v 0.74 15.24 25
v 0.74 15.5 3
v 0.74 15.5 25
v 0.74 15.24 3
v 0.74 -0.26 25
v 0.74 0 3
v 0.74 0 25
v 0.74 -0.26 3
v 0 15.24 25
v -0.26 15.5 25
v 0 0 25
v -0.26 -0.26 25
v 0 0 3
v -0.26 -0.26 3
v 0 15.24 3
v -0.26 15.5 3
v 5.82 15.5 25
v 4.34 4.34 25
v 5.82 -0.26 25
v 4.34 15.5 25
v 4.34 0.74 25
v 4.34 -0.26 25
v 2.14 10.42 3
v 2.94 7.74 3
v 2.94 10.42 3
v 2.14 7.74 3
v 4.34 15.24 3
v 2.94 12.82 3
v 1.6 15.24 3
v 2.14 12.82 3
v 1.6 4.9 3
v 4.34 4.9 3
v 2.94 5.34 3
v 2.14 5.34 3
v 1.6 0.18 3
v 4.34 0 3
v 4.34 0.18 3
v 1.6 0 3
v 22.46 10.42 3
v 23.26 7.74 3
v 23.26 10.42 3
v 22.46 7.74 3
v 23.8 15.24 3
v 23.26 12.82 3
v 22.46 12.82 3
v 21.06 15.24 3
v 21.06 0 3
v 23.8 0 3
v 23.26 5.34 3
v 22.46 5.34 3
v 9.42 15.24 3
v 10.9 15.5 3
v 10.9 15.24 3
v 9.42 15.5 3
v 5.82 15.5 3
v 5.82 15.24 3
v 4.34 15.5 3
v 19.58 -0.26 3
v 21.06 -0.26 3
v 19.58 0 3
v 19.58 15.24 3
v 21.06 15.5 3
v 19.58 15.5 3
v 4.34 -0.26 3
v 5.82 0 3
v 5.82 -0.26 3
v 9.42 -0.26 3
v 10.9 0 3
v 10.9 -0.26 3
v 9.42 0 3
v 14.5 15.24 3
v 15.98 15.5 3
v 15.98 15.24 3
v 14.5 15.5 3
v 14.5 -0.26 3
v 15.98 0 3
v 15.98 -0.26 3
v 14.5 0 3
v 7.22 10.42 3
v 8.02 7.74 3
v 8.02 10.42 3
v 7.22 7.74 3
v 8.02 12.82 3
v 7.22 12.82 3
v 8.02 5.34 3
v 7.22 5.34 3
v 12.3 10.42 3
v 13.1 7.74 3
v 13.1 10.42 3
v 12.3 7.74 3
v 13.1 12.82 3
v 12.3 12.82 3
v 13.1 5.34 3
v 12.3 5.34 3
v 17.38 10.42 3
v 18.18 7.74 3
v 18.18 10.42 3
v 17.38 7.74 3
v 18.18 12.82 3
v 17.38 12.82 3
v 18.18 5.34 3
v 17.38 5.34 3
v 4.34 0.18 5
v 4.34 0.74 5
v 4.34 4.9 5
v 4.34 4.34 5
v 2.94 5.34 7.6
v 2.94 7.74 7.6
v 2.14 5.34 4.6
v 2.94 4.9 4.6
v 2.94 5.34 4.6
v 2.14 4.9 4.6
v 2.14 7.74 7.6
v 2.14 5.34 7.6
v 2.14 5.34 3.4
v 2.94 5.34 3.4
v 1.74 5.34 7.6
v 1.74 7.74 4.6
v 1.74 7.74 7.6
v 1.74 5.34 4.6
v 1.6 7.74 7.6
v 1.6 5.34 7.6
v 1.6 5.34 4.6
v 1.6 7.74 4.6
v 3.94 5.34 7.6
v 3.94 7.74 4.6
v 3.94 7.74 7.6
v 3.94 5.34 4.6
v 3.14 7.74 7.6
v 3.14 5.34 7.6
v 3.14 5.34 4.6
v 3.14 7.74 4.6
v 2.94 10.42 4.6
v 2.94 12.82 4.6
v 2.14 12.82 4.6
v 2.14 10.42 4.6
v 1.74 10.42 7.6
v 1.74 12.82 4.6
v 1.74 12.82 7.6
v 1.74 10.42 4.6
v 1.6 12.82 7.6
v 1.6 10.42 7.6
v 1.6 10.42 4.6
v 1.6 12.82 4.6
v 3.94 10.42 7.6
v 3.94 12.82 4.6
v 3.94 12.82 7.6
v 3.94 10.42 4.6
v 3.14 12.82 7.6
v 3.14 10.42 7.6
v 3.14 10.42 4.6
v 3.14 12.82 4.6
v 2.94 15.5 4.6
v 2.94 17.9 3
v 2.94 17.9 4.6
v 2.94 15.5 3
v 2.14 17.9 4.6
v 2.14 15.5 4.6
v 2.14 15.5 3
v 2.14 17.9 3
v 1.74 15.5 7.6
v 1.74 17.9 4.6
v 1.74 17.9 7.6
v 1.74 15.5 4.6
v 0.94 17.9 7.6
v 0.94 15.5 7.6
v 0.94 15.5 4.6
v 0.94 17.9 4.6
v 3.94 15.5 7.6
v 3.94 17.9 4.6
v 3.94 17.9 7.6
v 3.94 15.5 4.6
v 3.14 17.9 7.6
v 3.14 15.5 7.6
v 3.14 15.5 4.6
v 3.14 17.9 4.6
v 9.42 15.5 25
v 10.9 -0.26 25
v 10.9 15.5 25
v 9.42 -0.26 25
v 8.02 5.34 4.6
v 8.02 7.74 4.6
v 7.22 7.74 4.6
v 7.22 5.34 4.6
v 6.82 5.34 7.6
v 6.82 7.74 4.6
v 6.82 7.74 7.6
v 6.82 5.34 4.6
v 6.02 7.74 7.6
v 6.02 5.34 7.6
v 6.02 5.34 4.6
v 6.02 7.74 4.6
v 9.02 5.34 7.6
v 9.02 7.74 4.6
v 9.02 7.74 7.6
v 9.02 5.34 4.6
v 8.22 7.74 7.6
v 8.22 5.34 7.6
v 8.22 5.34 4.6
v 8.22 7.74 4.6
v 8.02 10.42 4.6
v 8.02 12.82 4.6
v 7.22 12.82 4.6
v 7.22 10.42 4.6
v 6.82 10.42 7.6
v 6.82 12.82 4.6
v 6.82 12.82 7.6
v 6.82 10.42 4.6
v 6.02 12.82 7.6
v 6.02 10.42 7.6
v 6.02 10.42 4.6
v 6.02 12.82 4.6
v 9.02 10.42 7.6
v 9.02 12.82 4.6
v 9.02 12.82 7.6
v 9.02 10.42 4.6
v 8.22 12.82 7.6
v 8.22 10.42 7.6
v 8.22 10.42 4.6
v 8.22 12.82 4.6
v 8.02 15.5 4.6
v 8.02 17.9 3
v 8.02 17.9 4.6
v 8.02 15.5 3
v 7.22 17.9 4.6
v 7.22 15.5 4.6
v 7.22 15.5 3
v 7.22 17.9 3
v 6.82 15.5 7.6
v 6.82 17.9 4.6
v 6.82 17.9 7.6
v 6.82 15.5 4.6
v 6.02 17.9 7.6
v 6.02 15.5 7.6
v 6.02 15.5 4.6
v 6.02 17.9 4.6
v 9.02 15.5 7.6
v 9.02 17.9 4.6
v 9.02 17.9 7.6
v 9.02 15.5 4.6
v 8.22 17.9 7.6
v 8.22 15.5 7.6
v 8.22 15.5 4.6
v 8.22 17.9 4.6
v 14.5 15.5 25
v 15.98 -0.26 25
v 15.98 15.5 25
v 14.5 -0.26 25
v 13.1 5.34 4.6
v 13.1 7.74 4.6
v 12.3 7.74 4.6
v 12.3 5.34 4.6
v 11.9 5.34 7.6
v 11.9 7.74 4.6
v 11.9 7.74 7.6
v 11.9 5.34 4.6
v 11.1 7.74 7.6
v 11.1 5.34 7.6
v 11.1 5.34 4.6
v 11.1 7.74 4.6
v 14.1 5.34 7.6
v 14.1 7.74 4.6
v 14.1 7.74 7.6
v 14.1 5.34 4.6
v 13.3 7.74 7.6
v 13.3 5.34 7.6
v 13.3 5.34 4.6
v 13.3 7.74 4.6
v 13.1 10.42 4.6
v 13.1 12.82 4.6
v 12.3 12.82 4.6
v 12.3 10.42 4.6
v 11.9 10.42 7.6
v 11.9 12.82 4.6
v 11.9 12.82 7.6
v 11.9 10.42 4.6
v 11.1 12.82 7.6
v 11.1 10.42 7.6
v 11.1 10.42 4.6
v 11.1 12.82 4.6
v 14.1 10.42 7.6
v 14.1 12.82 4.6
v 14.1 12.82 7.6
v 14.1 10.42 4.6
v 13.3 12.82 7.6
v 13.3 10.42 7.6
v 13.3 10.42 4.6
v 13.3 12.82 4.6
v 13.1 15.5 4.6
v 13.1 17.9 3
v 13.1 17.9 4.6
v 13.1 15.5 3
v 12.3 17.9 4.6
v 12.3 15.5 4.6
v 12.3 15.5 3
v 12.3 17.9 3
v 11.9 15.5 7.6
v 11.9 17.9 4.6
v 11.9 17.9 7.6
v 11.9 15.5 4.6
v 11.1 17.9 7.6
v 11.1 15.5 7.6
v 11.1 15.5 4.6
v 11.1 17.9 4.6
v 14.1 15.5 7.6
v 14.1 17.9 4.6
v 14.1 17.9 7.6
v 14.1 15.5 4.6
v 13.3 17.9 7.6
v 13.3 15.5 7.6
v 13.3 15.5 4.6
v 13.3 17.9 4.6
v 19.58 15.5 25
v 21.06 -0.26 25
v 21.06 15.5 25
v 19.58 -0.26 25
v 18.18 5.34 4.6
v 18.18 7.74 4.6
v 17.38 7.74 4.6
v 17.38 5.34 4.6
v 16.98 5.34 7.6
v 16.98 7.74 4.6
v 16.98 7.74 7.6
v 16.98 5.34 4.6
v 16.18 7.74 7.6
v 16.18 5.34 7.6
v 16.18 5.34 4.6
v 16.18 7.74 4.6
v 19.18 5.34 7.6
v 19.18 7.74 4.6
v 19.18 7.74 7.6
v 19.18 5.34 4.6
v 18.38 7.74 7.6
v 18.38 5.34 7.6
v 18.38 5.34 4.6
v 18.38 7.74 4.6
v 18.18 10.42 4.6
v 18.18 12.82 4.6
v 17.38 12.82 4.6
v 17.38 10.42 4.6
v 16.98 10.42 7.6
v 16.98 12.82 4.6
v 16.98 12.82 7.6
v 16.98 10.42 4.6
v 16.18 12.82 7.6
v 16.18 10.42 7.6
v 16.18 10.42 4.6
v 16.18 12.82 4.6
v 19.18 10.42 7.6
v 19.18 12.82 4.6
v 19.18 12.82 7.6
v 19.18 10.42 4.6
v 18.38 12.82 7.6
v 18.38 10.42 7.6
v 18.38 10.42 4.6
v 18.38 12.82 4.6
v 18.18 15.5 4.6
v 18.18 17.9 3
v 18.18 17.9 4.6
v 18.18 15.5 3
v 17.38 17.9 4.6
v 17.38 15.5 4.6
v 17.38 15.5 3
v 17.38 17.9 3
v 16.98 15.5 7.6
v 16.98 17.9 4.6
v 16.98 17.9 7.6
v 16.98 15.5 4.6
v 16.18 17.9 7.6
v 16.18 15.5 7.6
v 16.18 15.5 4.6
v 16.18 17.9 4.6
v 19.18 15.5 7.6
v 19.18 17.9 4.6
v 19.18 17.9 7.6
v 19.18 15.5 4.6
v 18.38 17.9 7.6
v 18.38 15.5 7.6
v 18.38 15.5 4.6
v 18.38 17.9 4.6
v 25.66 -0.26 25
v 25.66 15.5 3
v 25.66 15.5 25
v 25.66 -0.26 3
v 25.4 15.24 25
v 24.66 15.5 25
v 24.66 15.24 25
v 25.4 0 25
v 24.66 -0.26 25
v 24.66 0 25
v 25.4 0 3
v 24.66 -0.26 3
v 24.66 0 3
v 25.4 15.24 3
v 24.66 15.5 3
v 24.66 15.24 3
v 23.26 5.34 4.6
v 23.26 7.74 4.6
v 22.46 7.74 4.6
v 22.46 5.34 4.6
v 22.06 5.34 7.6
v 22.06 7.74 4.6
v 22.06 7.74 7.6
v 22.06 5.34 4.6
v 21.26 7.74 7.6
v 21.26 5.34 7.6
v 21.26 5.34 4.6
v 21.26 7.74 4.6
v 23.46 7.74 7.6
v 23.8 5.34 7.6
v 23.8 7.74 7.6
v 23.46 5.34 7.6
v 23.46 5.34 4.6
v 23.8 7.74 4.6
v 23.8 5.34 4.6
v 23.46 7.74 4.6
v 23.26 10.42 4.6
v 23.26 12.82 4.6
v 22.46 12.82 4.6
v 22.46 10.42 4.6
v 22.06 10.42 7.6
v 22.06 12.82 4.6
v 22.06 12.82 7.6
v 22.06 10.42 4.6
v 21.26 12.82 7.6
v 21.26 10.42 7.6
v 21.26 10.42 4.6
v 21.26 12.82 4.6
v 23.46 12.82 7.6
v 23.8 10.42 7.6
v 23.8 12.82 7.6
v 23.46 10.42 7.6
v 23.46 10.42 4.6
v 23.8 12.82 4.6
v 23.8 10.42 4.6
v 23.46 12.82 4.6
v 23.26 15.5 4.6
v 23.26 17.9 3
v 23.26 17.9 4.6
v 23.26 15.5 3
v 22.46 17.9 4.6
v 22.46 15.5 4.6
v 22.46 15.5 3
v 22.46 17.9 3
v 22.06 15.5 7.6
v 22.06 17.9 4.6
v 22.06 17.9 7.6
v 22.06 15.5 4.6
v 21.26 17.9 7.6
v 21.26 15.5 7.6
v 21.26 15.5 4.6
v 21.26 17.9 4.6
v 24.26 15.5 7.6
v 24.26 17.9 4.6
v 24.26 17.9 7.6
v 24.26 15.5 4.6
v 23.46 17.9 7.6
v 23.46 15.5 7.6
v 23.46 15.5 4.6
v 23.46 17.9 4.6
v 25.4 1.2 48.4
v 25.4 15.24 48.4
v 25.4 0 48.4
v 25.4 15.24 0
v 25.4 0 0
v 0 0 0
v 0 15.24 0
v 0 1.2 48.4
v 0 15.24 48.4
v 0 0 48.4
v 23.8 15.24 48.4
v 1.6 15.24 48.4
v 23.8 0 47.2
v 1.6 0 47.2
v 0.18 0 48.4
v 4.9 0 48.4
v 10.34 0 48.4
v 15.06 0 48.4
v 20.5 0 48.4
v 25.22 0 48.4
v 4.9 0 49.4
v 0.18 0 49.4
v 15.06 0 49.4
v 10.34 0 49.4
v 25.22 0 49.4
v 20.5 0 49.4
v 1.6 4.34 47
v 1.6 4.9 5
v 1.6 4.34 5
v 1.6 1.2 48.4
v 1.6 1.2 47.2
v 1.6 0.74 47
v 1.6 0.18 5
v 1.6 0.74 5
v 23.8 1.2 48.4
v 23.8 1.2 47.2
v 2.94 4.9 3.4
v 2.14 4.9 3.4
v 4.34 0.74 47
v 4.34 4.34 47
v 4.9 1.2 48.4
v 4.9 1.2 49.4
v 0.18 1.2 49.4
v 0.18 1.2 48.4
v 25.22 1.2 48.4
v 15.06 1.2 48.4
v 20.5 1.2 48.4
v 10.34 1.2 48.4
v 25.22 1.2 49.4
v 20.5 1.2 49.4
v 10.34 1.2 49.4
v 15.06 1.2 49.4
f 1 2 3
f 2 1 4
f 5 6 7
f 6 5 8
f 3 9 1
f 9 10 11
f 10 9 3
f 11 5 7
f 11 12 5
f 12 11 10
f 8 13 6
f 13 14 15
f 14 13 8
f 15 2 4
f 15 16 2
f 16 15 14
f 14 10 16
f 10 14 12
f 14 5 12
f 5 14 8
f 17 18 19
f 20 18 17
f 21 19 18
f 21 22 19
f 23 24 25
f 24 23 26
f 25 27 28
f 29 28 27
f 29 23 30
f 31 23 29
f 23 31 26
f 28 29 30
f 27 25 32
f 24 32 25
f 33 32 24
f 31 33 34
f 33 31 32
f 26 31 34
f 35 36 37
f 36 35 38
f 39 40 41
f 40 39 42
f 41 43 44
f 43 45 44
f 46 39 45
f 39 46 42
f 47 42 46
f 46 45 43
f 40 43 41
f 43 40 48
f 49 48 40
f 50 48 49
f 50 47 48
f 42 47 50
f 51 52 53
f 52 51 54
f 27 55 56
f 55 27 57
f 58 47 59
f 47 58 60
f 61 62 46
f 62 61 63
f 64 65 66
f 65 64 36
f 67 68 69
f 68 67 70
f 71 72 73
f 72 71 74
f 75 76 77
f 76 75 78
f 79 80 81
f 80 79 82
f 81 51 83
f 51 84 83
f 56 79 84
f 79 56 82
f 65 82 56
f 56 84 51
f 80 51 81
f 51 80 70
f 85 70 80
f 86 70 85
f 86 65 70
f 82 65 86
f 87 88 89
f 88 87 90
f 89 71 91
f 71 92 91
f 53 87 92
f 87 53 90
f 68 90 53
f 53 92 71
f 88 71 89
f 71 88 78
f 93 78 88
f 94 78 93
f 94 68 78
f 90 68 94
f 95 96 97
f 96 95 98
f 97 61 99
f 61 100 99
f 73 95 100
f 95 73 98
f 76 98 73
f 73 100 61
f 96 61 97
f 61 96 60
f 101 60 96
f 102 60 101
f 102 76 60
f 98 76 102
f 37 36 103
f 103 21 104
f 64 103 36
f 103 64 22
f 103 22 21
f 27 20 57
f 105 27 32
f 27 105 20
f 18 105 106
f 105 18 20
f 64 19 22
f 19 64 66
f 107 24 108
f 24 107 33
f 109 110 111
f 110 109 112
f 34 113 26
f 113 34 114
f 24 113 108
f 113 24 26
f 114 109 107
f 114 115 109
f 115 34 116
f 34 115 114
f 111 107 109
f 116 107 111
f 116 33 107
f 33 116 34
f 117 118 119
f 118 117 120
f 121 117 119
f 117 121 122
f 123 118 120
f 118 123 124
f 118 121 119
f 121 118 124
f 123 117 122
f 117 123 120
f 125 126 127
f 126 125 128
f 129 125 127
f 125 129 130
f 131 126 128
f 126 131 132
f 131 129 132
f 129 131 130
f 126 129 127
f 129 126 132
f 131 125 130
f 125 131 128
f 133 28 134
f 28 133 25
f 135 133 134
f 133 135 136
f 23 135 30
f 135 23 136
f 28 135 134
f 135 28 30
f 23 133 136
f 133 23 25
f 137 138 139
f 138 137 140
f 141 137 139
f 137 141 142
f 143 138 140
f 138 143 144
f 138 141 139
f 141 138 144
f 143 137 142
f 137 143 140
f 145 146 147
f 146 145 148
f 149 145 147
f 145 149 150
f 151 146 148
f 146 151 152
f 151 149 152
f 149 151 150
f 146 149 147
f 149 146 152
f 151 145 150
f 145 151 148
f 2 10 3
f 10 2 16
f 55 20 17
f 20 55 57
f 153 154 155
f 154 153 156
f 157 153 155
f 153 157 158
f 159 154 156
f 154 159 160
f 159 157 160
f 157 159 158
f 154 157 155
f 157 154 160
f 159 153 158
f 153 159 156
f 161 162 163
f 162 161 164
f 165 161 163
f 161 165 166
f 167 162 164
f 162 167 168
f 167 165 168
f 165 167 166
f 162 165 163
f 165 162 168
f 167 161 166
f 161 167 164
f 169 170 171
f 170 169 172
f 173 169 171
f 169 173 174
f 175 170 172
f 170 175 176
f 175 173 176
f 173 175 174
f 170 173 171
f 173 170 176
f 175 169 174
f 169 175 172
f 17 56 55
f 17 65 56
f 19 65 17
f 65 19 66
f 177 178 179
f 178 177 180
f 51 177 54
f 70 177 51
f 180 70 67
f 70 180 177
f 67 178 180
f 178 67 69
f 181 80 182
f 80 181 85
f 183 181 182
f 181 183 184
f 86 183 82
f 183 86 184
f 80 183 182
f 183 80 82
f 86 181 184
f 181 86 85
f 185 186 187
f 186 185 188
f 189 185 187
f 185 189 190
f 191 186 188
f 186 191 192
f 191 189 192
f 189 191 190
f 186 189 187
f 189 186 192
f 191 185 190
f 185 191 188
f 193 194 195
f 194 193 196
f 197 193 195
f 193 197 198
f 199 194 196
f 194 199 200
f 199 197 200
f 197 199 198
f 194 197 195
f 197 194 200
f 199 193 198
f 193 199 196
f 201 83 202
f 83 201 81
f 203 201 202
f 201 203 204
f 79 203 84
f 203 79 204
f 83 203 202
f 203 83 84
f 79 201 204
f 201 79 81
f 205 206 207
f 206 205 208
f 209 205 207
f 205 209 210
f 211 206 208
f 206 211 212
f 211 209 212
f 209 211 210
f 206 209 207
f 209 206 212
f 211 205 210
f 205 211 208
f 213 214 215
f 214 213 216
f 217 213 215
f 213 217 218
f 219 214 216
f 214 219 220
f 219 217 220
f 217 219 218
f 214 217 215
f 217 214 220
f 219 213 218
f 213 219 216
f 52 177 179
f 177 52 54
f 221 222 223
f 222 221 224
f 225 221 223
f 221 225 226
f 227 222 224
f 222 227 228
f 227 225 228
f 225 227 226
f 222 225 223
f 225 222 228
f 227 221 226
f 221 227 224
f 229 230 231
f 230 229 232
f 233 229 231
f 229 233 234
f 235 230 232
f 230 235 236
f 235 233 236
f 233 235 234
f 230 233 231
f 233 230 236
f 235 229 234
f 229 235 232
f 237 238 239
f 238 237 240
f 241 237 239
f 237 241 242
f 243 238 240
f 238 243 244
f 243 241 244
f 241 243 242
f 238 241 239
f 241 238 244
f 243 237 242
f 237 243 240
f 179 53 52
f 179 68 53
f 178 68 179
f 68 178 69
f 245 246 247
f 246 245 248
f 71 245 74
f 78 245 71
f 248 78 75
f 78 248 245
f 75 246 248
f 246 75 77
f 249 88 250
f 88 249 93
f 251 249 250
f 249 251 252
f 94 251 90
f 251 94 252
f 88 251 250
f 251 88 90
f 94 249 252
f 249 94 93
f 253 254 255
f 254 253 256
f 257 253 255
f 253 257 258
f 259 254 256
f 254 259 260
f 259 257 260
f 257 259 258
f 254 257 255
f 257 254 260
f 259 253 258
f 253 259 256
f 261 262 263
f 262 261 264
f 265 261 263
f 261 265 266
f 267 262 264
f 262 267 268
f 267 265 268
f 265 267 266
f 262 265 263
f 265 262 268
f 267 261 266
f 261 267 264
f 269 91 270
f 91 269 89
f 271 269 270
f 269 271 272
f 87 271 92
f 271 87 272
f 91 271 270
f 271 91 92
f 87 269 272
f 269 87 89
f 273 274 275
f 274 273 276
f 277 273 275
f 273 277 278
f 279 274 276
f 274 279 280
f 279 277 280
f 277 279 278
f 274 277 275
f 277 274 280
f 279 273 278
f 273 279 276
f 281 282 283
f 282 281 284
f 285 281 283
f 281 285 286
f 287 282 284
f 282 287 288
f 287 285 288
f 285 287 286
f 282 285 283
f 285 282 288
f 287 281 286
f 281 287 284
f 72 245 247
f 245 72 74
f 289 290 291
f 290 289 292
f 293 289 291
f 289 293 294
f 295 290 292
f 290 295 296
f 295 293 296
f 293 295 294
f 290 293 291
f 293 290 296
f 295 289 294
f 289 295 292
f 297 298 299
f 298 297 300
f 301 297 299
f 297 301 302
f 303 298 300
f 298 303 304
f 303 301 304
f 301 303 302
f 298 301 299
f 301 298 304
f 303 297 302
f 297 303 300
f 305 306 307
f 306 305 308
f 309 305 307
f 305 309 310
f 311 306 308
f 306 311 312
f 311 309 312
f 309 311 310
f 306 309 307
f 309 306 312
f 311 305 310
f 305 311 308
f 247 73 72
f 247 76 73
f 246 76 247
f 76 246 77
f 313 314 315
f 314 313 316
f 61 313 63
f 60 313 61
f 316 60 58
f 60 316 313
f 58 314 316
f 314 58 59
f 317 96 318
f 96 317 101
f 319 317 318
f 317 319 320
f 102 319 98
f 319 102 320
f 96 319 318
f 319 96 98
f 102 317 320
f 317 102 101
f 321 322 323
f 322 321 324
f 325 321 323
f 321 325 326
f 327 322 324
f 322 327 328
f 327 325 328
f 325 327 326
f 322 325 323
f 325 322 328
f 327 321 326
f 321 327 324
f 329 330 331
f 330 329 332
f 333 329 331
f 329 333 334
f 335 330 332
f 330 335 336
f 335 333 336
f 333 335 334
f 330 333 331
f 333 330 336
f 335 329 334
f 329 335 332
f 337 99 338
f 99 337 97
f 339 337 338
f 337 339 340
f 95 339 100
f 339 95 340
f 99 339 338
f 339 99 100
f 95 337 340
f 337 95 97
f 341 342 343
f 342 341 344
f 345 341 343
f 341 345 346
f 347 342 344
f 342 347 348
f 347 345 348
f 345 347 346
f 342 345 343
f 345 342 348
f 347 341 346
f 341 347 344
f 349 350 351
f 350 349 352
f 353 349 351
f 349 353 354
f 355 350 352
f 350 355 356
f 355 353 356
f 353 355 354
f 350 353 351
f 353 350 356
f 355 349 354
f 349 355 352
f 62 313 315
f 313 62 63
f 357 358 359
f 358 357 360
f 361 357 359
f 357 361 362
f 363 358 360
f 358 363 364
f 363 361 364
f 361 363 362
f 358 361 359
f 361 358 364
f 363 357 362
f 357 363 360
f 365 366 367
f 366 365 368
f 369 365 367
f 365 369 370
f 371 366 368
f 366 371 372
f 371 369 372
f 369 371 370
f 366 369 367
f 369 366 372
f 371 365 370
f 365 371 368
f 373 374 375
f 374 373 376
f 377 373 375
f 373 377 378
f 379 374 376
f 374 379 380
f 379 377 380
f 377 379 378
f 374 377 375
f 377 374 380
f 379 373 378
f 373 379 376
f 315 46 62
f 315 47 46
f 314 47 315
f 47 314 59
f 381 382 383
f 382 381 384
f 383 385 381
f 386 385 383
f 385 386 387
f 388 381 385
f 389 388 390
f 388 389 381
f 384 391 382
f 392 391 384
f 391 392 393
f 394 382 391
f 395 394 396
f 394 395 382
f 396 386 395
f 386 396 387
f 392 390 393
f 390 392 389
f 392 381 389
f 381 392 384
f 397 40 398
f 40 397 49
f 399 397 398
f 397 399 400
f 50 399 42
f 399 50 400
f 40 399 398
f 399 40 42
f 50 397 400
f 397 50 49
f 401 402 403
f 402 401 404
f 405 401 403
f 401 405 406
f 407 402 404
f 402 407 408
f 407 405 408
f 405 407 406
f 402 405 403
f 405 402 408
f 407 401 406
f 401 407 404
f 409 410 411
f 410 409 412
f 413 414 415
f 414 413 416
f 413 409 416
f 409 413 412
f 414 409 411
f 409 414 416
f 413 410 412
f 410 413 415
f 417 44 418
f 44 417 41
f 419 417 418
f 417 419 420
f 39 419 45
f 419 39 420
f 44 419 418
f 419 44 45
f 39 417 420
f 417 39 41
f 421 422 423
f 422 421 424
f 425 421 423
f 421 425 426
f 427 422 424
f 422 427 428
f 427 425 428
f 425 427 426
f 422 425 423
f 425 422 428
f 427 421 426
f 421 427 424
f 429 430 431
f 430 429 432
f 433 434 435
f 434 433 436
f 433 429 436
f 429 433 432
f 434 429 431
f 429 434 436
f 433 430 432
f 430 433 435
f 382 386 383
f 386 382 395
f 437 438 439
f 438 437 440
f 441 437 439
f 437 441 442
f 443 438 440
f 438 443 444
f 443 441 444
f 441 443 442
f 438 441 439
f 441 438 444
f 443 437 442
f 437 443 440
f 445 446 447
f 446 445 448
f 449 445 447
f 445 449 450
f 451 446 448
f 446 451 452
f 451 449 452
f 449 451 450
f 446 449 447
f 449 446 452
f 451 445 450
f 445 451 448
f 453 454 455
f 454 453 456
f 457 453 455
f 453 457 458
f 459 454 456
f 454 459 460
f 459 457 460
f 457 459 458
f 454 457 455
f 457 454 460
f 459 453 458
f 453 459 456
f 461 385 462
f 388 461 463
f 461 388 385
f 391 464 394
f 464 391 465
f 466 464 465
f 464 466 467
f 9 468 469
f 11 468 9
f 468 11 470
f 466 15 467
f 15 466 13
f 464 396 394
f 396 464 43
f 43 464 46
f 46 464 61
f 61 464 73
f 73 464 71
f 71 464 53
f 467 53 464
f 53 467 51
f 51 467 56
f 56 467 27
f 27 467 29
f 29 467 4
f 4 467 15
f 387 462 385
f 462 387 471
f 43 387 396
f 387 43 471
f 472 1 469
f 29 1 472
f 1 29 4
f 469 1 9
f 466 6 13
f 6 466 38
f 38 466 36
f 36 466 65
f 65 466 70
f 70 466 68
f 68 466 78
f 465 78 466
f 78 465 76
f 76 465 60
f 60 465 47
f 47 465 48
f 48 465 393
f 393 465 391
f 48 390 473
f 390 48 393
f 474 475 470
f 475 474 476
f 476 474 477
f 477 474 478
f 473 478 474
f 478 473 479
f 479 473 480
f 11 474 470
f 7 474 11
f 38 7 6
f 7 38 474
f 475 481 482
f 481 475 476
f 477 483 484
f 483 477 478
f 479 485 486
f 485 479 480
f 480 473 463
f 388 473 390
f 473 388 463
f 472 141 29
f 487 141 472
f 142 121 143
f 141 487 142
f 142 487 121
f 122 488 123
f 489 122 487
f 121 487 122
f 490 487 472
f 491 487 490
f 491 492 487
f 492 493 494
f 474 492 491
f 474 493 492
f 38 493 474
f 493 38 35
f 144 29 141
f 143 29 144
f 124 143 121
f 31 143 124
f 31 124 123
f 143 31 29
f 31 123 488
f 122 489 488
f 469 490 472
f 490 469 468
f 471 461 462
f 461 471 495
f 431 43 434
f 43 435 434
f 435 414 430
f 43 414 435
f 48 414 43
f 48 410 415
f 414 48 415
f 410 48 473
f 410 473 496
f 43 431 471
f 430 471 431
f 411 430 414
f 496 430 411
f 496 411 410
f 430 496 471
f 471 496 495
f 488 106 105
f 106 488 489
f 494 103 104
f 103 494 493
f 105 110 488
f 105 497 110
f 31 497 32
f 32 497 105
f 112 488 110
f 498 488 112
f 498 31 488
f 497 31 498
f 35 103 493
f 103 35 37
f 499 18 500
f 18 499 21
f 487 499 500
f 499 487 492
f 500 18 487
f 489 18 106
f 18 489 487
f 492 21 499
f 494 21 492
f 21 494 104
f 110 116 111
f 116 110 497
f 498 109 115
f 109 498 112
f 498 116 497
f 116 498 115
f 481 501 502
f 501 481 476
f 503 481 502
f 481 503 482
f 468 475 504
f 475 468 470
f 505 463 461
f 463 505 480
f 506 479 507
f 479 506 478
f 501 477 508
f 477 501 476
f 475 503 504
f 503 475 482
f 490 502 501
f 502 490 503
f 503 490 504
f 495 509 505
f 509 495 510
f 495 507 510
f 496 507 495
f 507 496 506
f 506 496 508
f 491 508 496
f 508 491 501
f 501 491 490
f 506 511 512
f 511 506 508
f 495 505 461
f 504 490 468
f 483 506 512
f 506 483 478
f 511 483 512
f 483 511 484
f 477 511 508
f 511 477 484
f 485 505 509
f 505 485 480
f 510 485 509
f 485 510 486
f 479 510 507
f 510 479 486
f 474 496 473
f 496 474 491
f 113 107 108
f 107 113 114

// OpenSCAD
// GENERATED by build_coupon.py from params.json. Do not edit by hand.
// S1 threshold-ratchet PRINTABLE coupon: 5 x 3 cells at true pitch.
// Self-supporting box geometry; every moving part is a separate printed solid.
// CAD solid -- not fabrication or physical validation.
$fn=48;
eps=0.01;
pitch=5.08; nx=5; ny=3;
col_cap=4.72; col_body=3.6; col_h=44.0;
rack_pitch=10.0; pocket_w=2.4; pocket_d=1.2; pocket_h=2.0;
pawl_t=0.8; pawl_root=2.4; pawl_free=3.6; pawl_h=1.6;
gate_t=0.8; gate_h=3.0; gate_z0=1.6;
plate_t=1.2; boss_h=1.0;
bleed=0.2; base_t=3.0; rail_w=1.6; levels=5;

module column() {
    cube([col_cap, col_cap, 2.0], center=false);
    translate([(col_cap-col_body)/2,(col_cap-col_body)/2,0])
        cube([col_body,col_body,col_h], center=false);
    for (k=[1:levels-1])
        translate([(col_body-pocket_w)/2, col_body-pocket_d, 2.0+k*rack_pitch-pocket_h])
            cube([pocket_w,pocket_d,pocket_h], center=false);
}

module pawl() {
    cube([pawl_t, pawl_root, pawl_h]);
    translate([0,-pawl_free,pawl_h-1.2]) cube([pawl_t,pawl_free,1.2]);
    translate([0,-pawl_free-1.0,pawl_h-1.2]) cube([pawl_t,1.0,1.2]);
}

module gate() { cube([gate_t, pawl_root, gate_h]); }

module threshold_plate() {
    cube([nx*pitch, plate_t, plate_t]);
    for (i=[0:nx-1]) if (i%2==0)
        translate([i*pitch+(pitch-col_cap)/2,0,plate_t]) cube([col_cap,plate_t,boss_h]);
}

module frame() {
    cube([nx*pitch, ny*pitch, base_t]);
    rail_z = base_t + col_h + 0.2;
    translate([0,0,base_t]) cube([rail_w, ny*pitch, rail_z-base_t+plate_t]);
    translate([nx*pitch-rail_w,0,base_t]) cube([rail_w, ny*pitch, rail_z-base_t+plate_t]);
    sw=1.0;
    for (i=[0:nx-1], j=[0:ny-1]) {
        ox=i*pitch; oy=j*pitch;
        bx=ox+(pitch-col_body)/2; by=oy+(pitch-col_body)/2;
        translate([bx-sw,by-sw,base_t]) cube([sw, col_body+2*sw, col_h*0.5]);
        translate([bx+col_body,by-sw,base_t]) cube([sw, col_body+2*sw, col_h*0.5]);
        ry=by+col_body+sw; ax=ox+(pitch-pawl_t)/2;
        translate([ax,ry,base_t]) cube([pawl_t,pawl_root,pawl_h]);
        translate([ax-gate_t-2*bleed,ry,base_t+gate_z0]) cube([gate_t, pawl_root, gate_h]);
        translate([ax+pawl_t+bleed,ry,base_t+gate_z0]) cube([gate_t, pawl_root, gate_h]);
    }
}

frame();
translate([(pitch-col_cap)/2,(pitch-col_cap)/2,base_t]) column();
translate([(pitch-pawl_t)/2,(pitch-col_body)/2+col_body+1.0,base_t]) pawl();
translate([(pitch-pawl_t)/2,(pitch-col_body)/2+col_body+1.0,base_t+gate_z0]) gate();
translate([0,0,base_t+col_h+0.2]) threshold_plate();
